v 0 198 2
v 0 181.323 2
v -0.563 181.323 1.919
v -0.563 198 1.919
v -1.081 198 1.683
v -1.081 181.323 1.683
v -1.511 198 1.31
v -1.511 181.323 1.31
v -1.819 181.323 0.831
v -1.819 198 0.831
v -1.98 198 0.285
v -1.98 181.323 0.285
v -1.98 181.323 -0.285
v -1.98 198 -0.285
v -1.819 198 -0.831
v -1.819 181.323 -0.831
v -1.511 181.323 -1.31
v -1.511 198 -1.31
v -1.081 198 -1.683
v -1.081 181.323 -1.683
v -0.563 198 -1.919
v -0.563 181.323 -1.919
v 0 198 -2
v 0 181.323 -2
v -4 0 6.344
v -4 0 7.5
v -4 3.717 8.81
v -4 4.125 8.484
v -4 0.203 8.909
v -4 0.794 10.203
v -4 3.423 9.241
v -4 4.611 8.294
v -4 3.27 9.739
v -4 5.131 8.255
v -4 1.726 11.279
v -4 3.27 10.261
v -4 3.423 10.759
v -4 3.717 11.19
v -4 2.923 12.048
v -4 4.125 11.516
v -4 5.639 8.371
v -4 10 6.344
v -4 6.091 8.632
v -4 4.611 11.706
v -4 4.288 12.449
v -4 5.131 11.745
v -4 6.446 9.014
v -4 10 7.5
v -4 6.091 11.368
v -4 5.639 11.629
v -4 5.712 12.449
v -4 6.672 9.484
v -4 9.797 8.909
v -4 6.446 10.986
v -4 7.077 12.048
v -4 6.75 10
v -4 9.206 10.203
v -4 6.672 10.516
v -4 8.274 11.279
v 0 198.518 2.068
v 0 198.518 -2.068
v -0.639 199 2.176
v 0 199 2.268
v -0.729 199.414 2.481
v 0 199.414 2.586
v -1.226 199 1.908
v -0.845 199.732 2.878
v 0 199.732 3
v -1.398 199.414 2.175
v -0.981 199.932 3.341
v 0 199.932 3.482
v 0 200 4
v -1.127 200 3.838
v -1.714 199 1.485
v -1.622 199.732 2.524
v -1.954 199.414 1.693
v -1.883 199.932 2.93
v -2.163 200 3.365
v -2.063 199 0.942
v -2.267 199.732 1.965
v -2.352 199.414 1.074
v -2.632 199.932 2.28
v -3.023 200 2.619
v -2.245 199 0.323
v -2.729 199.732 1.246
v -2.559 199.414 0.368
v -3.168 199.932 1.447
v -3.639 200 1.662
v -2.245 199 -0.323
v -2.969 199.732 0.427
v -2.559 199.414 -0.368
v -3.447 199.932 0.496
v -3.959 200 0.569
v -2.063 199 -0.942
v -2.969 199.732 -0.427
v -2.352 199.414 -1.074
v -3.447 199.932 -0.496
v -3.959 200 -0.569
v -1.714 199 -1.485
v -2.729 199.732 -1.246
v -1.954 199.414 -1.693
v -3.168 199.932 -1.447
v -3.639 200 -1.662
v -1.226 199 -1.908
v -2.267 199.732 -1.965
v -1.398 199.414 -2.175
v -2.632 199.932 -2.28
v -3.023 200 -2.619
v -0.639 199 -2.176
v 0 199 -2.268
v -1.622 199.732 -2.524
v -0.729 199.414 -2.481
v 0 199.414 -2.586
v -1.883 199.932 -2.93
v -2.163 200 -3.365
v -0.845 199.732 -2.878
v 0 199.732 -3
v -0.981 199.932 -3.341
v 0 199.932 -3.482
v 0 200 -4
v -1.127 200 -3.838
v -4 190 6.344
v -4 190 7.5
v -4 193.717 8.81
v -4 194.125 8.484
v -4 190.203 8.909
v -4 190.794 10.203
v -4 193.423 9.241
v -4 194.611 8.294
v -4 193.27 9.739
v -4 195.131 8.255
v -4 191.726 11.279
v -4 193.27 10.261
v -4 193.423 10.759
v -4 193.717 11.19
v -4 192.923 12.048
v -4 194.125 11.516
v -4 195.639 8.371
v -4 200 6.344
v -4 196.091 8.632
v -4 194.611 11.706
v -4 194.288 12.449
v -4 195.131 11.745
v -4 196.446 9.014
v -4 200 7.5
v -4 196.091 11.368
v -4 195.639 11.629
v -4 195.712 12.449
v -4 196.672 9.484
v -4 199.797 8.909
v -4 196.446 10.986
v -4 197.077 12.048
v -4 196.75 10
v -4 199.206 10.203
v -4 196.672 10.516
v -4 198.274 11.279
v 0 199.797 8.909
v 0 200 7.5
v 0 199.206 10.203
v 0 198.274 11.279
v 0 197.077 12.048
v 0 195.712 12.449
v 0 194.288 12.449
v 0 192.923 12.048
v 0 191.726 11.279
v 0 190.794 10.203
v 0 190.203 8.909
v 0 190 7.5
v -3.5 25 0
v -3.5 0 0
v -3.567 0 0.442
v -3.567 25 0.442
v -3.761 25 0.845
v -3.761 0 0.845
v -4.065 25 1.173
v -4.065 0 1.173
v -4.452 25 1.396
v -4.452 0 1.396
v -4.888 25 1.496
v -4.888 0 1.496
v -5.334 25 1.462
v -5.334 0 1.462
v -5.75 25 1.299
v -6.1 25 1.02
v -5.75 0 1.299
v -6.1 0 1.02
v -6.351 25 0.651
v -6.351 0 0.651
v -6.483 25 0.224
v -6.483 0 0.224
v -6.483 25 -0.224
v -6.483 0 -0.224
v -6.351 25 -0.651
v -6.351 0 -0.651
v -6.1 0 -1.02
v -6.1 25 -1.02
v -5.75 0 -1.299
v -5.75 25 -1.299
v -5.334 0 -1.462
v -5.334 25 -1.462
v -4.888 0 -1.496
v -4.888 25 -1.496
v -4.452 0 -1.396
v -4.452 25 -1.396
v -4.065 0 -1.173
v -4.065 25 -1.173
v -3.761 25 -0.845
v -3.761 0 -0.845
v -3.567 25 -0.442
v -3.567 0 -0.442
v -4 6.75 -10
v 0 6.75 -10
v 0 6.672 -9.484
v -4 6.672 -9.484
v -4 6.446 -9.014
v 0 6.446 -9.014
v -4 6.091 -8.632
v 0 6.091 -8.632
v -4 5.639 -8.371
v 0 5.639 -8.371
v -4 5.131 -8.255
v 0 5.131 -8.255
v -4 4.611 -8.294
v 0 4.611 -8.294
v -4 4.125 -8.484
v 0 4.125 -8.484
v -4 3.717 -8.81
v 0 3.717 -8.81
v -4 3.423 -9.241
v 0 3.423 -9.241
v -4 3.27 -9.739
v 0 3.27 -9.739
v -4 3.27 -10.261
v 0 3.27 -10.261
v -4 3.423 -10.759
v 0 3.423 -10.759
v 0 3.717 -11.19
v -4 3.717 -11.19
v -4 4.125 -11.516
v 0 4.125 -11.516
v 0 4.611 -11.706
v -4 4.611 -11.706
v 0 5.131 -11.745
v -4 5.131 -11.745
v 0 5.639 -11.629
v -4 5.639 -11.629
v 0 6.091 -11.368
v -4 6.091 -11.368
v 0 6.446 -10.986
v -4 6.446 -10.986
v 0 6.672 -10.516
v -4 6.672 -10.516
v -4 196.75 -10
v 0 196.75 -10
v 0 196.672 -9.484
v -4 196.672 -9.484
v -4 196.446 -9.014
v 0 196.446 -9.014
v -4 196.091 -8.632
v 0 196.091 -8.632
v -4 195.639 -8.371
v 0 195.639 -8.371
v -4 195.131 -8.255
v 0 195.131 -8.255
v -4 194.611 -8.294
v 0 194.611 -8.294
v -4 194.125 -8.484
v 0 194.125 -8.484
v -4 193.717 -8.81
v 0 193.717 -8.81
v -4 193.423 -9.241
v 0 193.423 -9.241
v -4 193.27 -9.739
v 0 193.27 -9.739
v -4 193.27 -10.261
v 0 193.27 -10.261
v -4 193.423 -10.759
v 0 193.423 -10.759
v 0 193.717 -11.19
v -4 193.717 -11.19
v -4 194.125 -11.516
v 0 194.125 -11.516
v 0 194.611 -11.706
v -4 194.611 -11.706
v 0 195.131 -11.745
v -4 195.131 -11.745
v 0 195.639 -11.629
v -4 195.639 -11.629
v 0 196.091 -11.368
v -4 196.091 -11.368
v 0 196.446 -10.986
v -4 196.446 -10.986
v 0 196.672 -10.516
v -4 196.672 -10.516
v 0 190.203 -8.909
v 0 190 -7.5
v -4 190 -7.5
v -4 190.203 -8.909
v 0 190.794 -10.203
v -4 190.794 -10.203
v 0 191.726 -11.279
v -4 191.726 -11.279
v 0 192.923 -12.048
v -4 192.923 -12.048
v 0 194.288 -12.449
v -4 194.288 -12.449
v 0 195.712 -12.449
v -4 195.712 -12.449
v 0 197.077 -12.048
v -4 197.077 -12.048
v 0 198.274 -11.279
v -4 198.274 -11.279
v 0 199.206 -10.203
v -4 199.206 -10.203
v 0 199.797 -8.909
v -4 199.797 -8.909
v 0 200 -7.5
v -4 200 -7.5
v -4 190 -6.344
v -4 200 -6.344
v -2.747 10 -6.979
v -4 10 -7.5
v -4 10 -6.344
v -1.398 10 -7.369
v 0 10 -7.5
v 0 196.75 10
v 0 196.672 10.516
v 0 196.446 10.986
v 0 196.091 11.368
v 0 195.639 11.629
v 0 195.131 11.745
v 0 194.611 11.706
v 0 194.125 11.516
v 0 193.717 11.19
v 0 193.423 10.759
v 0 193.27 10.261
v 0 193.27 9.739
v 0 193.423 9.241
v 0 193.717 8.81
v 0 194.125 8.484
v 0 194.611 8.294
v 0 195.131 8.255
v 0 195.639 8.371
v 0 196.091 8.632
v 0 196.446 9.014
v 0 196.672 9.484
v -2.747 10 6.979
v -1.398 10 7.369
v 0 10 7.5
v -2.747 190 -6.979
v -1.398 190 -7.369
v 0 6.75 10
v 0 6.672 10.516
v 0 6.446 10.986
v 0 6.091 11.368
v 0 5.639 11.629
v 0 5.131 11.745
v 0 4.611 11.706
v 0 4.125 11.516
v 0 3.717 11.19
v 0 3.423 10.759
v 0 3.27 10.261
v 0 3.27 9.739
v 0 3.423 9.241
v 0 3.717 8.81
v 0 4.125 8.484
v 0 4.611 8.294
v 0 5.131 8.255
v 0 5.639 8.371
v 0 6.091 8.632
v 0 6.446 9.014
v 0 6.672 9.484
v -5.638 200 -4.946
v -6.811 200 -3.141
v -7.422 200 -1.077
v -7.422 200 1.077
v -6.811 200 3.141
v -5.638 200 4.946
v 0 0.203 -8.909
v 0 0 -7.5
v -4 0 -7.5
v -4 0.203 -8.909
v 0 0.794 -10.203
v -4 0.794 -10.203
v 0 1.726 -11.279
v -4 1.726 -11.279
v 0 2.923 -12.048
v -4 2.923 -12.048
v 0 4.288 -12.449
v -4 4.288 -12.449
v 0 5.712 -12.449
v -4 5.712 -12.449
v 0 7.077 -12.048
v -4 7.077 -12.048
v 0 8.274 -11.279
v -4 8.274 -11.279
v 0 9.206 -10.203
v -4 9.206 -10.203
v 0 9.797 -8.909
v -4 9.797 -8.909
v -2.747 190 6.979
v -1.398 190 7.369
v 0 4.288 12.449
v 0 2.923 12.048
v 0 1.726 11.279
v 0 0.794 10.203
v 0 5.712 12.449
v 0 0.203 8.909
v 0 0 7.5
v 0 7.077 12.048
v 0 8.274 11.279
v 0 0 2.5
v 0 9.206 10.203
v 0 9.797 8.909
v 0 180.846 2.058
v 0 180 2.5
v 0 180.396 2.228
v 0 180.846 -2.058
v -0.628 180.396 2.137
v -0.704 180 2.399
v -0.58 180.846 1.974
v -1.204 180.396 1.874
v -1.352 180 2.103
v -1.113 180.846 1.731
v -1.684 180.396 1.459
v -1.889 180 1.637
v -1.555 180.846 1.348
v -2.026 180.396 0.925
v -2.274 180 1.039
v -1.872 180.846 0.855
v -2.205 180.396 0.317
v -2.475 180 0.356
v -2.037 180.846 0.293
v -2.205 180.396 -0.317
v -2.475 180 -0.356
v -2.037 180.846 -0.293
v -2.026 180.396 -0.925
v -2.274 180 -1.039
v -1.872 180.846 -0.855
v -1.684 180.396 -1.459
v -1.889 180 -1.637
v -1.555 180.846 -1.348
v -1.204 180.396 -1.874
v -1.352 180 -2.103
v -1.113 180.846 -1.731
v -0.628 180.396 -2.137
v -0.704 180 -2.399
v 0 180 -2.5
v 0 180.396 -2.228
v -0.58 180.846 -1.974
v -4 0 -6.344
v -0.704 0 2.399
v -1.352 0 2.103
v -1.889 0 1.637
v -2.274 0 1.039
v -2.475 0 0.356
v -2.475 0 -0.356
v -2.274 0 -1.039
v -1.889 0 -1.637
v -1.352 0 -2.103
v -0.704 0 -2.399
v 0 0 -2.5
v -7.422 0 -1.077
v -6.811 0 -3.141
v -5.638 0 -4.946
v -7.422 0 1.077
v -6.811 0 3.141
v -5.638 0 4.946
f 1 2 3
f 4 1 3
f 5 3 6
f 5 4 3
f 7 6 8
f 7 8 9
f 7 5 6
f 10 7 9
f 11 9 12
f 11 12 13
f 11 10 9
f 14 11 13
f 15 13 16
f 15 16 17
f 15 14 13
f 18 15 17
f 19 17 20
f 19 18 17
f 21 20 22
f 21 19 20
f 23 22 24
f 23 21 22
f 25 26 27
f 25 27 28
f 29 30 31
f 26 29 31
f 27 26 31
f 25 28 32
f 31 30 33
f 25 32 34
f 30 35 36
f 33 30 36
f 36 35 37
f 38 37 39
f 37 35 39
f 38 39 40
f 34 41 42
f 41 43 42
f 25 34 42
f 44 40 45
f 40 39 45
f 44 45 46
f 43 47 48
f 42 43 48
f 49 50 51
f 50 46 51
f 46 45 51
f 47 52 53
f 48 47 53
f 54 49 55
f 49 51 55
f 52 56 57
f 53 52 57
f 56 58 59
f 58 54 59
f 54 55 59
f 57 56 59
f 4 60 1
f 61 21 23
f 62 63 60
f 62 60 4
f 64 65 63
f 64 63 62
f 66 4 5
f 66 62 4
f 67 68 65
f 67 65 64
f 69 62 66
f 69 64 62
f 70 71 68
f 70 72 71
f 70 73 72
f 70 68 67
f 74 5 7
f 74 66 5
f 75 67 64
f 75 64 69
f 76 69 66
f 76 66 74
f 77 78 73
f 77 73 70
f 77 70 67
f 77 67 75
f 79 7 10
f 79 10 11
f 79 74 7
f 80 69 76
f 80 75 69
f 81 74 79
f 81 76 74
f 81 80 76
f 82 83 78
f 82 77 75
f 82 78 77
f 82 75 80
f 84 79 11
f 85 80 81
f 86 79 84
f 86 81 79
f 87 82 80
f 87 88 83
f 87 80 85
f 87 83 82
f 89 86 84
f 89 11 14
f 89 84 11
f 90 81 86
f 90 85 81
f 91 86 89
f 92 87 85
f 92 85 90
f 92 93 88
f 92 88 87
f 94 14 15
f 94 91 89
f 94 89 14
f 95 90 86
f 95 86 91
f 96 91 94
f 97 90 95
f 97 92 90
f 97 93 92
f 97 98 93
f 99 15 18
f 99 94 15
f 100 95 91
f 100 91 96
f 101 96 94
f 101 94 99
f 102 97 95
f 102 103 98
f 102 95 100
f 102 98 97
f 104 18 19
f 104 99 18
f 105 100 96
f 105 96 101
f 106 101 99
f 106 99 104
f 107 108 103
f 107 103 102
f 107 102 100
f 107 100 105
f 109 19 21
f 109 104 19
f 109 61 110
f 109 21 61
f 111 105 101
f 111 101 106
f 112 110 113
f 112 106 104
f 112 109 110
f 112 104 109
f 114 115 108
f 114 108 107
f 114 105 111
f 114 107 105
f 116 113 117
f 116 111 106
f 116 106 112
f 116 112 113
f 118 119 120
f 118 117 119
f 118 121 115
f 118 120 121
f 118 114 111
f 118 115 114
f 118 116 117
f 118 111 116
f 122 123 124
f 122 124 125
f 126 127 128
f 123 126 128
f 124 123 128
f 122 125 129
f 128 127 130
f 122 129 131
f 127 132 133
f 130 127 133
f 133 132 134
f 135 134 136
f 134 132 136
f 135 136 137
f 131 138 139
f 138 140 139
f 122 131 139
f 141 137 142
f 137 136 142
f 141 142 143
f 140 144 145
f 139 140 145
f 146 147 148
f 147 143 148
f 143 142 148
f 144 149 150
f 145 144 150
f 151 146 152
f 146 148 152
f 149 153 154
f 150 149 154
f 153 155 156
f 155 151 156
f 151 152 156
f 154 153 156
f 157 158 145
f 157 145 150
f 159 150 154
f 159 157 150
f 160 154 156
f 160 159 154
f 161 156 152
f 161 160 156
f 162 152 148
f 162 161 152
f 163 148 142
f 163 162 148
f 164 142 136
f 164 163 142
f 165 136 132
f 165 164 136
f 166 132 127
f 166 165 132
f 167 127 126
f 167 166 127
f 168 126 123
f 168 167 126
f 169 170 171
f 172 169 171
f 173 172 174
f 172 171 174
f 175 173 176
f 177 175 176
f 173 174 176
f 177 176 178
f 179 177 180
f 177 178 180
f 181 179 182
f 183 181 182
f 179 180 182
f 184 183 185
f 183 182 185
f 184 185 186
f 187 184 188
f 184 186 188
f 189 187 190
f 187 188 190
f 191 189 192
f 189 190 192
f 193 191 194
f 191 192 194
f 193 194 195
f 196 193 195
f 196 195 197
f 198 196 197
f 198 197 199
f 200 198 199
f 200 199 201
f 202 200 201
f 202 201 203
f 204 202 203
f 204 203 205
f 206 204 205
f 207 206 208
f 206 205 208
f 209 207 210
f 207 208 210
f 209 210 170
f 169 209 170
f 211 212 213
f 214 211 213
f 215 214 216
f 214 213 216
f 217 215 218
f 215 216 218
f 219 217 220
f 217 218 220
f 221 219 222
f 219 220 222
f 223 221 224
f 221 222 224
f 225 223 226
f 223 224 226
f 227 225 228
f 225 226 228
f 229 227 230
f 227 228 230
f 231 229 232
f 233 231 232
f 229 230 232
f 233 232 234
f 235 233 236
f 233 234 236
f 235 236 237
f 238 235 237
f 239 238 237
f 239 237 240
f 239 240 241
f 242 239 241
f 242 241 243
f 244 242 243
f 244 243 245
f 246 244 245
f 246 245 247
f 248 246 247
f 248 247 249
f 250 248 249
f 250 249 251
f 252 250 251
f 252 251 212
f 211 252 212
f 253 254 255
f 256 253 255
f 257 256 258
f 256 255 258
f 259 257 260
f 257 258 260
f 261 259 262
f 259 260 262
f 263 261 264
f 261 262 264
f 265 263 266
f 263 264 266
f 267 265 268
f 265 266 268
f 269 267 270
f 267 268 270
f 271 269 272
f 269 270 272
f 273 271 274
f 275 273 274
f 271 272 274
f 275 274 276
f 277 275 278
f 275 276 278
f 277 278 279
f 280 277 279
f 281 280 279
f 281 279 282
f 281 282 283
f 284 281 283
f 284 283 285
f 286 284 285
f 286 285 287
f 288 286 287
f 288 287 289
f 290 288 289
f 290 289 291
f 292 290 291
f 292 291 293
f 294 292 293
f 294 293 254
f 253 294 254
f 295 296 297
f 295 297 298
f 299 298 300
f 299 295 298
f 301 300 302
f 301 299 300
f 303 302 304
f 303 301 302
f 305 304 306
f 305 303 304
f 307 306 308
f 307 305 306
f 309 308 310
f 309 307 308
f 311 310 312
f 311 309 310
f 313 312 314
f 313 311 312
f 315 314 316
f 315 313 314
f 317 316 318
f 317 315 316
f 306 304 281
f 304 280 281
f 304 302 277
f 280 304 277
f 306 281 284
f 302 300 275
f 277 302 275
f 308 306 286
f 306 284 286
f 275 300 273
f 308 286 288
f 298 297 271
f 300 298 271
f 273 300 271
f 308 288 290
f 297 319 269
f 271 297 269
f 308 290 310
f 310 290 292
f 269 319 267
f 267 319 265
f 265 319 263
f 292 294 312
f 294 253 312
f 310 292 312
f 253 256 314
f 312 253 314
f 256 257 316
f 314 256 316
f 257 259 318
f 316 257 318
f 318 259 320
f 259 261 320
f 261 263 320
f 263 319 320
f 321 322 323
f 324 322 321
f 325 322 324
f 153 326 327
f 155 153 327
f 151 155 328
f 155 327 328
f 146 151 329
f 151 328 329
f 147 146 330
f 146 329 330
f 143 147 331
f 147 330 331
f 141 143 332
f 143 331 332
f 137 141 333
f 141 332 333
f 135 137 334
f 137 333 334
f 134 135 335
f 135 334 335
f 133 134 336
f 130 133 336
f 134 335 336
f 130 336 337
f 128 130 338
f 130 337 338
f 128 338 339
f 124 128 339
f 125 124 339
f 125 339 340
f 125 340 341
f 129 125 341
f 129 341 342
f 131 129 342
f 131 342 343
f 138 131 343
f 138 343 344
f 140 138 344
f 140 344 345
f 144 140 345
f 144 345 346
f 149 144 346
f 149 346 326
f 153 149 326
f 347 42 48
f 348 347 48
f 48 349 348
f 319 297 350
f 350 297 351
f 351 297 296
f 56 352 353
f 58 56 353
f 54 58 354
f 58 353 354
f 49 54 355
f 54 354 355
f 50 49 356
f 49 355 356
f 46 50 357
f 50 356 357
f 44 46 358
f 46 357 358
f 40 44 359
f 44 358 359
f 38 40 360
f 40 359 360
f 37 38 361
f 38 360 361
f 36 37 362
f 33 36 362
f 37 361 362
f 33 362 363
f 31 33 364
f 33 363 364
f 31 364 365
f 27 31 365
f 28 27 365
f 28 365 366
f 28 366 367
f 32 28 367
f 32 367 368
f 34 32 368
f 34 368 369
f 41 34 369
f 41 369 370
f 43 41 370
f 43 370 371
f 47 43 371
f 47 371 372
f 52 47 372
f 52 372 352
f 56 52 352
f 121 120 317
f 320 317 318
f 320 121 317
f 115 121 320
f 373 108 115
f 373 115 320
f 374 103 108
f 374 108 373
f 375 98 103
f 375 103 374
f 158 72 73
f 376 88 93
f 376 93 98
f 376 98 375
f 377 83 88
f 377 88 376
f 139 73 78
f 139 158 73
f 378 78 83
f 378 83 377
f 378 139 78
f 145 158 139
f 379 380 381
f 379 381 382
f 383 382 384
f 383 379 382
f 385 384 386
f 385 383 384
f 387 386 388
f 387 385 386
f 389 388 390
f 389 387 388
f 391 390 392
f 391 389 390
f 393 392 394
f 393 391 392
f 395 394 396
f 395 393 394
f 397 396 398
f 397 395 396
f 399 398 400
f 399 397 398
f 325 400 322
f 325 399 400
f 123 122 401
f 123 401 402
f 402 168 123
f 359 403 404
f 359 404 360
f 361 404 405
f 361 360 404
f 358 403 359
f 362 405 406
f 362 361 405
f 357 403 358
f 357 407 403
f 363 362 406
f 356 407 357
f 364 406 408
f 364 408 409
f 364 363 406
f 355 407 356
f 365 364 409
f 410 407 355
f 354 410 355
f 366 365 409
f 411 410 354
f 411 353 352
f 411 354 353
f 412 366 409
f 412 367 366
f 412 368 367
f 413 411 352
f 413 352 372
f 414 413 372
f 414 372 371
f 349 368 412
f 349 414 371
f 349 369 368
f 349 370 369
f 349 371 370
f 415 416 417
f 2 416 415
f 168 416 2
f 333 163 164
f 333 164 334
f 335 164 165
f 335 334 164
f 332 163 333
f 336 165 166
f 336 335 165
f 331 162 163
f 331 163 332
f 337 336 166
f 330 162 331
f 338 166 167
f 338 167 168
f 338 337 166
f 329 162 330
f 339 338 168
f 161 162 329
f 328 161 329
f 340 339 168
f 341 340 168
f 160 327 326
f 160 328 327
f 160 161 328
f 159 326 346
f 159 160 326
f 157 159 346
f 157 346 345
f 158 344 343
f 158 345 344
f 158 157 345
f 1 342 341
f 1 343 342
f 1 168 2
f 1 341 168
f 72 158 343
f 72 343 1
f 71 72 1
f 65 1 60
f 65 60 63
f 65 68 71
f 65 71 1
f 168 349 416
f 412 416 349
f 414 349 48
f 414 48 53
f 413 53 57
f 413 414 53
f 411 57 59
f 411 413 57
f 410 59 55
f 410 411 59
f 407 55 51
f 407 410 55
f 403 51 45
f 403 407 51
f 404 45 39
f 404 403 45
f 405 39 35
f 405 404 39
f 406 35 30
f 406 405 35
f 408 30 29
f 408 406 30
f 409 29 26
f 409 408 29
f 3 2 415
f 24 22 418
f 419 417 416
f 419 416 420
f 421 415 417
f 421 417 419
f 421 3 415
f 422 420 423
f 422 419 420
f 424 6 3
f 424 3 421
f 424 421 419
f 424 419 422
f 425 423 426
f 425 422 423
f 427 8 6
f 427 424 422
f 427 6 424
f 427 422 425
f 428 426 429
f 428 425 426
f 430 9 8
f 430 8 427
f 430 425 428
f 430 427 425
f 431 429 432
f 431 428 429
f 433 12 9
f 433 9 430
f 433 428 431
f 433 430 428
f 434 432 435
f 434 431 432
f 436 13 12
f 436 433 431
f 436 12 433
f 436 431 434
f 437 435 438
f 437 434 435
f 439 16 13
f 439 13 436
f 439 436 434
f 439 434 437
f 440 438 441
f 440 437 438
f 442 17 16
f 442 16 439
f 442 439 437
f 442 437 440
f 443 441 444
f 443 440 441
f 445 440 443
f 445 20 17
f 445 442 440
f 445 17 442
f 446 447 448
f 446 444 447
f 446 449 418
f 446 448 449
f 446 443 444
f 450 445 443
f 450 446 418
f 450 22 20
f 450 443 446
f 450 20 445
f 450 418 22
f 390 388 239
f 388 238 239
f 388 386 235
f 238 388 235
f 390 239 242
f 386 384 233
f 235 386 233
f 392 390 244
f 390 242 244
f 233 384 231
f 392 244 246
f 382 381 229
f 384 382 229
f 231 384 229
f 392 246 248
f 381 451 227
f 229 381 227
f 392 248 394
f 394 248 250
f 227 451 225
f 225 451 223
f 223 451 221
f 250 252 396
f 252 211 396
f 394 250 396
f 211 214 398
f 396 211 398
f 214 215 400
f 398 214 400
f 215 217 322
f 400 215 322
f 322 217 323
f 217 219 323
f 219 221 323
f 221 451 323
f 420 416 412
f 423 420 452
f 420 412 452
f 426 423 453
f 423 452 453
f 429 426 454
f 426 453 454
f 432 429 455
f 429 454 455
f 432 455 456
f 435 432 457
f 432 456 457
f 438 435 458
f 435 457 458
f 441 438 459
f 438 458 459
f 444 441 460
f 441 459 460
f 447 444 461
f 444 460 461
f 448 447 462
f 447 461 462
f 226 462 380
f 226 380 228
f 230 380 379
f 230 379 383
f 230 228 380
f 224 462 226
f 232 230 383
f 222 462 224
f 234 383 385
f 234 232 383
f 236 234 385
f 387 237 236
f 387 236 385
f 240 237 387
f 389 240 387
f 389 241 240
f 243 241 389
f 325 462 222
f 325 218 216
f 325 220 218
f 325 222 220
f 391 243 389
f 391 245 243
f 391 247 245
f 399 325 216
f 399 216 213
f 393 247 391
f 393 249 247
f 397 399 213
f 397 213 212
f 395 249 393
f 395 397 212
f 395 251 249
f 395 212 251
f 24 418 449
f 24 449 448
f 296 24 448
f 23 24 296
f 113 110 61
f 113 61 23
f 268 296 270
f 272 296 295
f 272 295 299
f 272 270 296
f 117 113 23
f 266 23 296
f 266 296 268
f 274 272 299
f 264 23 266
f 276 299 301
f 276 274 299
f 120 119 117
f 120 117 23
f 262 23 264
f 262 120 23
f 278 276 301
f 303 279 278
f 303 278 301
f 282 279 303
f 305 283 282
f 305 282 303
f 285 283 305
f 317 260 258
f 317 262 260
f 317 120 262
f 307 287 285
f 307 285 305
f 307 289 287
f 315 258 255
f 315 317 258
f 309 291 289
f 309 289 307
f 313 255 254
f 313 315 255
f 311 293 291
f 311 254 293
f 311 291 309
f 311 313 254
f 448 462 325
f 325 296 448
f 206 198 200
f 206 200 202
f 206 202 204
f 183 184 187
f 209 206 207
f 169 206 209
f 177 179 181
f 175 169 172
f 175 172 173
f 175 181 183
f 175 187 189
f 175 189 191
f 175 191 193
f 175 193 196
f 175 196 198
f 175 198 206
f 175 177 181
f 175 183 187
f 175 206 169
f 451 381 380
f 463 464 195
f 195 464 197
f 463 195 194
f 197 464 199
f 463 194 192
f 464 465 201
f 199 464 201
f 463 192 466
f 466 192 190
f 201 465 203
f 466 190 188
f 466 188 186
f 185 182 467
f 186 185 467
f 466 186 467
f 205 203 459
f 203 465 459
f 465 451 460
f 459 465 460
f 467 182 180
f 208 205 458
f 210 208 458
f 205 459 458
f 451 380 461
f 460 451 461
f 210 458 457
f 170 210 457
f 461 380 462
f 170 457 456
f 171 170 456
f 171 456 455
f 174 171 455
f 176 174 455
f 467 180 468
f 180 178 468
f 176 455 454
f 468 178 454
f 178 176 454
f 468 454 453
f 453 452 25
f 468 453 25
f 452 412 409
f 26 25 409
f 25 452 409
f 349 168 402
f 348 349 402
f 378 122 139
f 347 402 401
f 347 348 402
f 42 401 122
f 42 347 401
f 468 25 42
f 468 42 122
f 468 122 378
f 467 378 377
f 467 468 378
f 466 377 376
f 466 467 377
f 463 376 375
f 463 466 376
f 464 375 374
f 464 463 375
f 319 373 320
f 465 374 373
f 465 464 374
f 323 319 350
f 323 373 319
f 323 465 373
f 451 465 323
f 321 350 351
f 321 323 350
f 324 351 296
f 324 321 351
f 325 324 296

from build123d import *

# Parameters (mm, degrees)
F0_R         = 7.5
F0_R_2       = 2.5
F1_DEPTH     = 200
F2_R         = 1.5
F3_DEPTH     = 25
F4_W         = 255.6320726871
F4_H         = 34.7503256053
F5_DEPTH     = 25
F6_W         = 10
F6_H         = 5
F6_H_2       = 4.8793365061
F7_DEPTH     = 4
F8_R         = 1.75
F9_DEPTH     = 7.501
F11_DEPTH    = 20
F12_T2_ANGLE = 359.64
F12_T4_ANGLE = 359.64


# Not quite as in the source:
# - a fillet or chamfer that OpenCascade refuses, or shapes differently, is made with other operations: its cross-section is extruded or revolved along the edge and cut away or added


with BuildPart() as f1:
    # F0 (on Front) → F1 (new body)
    with BuildSketch(Plane.XZ):
        Circle(F0_R)
        Circle(F0_R_2, mode=Mode.SUBTRACT)
    extrude(amount=-F1_DEPTH)

    # F2 (on face) → F3 (cut)
    with BuildSketch(Plane.XZ):
        with Locations((5, 0)):
            Circle(F2_R)
        with Locations((-5, 0)):
            Circle(F2_R)
    extrude(amount=-F3_DEPTH, mode=Mode.SUBTRACT)

    # F4 (on Right) → F5 (cut)
    with BuildSketch(Plane.YZ):
        with Locations((127.8160363436, -0.9753750637)):
            Rectangle(F4_W, F4_H)
    extrude(amount=F5_DEPTH, mode=Mode.SUBTRACT)

    # F6 (on face) → F7 (join)
    with BuildSketch(Plane.YZ):
        with BuildLine():
            ThreePointArc((10, 7.5), (5, 12.5), (0, 7.5))
            Line((0, 7.5), (10, 7.5))
        make_face()
        with Locations((5, 5)):
            Rectangle(F6_W, F6_H)
        with BuildLine():
            Line((190, 7.5), (200, 7.5))
            ThreePointArc((200, 7.5), (195, 12.5), (190, 7.5))
        make_face()
        with Locations((195, 5)):
            Rectangle(F6_W, F6_H)
        with BuildLine():
            ThreePointArc((190, -7.5), (195, -12.5), (200, -7.5))
            Line((200, -7.5), (190, -7.5))
        make_face()
        with Locations((195, -5.0603317469)):
            Rectangle(F6_W, F6_H_2)
        with BuildLine():
            Line((10, -7.5), (0, -7.5))
            ThreePointArc((0, -7.5), (5, -12.5), (10, -7.5))
        make_face()
        with Locations((5, -5.0603317469)):
            Rectangle(F6_W, F6_H_2)
    extrude(amount=-F7_DEPTH)

    # F8 (on face) → F9 (cut, through all)
    with BuildSketch(Plane.YZ):
        with Locations((5, 10)):
            Circle(F8_R)
        with Locations((5, -10)):
            Circle(F8_R)
        with Locations((195, 10)):
            Circle(F8_R)
        with Locations((195, -10)):
            Circle(F8_R)
    extrude(amount=-F9_DEPTH, mode=Mode.SUBTRACT)

    # F10 (on face) → F11 (join)
    with BuildSketch(Plane(origin=(0, 200, 0), x_dir=(-1, 0, 0), z_dir=(0, 1, 0))):
        with BuildLine():
            Line((0, 2.5), (0, 2))
            ThreePointArc((0, 2), (2, 0), (0, -2))
            Line((0, -2), (0, -2.5))
            ThreePointArc((0, -2.5), (2.5, 0), (0, 2.5))
        make_face()
    extrude(amount=-F11_DEPTH)

    # F12: fillet of radius 2 on 2 edges, made by hand

    # F12_s1 → F12_t2 (revolve, cut)
    with BuildSketch(Plane(origin=(0, 0, 0), x_dir=(0, 1, 0), z_dir=(0.0031415875, 0, -0.9999950652))):
        with BuildLine():
            ThreePointArc((198, 2), (199.4142135624, 2.5857864376), (200, 4))
            Line((200, 4), (200, 2))
            Line((200, 2), (198, 2))
        make_face()
    revolve(axis=Axis((0, 200, 0), (0, -1, 0)), revolution_arc=F12_T2_ANGLE, mode=Mode.SUBTRACT)

    # F12_s3 → F12_t4 (revolve, cut)
    with BuildSketch(Plane(origin=(0, 0, 0), x_dir=(0, 1, 0), z_dir=(0.0031415875, 0, -0.9999950652))):
        with BuildLine():
            ThreePointArc((180, 2.5), (180.6157688743, 2.1291713066), (181.3228756555, 2))
            Line((181.3228756555, 2), (180, 2))
            Line((180, 2), (180, 2.5))
        make_face()
    revolve(axis=Axis((0, 180, 0), (0, -1, 0)), revolution_arc=F12_T4_ANGLE, mode=Mode.SUBTRACT)


solid = f1.part
